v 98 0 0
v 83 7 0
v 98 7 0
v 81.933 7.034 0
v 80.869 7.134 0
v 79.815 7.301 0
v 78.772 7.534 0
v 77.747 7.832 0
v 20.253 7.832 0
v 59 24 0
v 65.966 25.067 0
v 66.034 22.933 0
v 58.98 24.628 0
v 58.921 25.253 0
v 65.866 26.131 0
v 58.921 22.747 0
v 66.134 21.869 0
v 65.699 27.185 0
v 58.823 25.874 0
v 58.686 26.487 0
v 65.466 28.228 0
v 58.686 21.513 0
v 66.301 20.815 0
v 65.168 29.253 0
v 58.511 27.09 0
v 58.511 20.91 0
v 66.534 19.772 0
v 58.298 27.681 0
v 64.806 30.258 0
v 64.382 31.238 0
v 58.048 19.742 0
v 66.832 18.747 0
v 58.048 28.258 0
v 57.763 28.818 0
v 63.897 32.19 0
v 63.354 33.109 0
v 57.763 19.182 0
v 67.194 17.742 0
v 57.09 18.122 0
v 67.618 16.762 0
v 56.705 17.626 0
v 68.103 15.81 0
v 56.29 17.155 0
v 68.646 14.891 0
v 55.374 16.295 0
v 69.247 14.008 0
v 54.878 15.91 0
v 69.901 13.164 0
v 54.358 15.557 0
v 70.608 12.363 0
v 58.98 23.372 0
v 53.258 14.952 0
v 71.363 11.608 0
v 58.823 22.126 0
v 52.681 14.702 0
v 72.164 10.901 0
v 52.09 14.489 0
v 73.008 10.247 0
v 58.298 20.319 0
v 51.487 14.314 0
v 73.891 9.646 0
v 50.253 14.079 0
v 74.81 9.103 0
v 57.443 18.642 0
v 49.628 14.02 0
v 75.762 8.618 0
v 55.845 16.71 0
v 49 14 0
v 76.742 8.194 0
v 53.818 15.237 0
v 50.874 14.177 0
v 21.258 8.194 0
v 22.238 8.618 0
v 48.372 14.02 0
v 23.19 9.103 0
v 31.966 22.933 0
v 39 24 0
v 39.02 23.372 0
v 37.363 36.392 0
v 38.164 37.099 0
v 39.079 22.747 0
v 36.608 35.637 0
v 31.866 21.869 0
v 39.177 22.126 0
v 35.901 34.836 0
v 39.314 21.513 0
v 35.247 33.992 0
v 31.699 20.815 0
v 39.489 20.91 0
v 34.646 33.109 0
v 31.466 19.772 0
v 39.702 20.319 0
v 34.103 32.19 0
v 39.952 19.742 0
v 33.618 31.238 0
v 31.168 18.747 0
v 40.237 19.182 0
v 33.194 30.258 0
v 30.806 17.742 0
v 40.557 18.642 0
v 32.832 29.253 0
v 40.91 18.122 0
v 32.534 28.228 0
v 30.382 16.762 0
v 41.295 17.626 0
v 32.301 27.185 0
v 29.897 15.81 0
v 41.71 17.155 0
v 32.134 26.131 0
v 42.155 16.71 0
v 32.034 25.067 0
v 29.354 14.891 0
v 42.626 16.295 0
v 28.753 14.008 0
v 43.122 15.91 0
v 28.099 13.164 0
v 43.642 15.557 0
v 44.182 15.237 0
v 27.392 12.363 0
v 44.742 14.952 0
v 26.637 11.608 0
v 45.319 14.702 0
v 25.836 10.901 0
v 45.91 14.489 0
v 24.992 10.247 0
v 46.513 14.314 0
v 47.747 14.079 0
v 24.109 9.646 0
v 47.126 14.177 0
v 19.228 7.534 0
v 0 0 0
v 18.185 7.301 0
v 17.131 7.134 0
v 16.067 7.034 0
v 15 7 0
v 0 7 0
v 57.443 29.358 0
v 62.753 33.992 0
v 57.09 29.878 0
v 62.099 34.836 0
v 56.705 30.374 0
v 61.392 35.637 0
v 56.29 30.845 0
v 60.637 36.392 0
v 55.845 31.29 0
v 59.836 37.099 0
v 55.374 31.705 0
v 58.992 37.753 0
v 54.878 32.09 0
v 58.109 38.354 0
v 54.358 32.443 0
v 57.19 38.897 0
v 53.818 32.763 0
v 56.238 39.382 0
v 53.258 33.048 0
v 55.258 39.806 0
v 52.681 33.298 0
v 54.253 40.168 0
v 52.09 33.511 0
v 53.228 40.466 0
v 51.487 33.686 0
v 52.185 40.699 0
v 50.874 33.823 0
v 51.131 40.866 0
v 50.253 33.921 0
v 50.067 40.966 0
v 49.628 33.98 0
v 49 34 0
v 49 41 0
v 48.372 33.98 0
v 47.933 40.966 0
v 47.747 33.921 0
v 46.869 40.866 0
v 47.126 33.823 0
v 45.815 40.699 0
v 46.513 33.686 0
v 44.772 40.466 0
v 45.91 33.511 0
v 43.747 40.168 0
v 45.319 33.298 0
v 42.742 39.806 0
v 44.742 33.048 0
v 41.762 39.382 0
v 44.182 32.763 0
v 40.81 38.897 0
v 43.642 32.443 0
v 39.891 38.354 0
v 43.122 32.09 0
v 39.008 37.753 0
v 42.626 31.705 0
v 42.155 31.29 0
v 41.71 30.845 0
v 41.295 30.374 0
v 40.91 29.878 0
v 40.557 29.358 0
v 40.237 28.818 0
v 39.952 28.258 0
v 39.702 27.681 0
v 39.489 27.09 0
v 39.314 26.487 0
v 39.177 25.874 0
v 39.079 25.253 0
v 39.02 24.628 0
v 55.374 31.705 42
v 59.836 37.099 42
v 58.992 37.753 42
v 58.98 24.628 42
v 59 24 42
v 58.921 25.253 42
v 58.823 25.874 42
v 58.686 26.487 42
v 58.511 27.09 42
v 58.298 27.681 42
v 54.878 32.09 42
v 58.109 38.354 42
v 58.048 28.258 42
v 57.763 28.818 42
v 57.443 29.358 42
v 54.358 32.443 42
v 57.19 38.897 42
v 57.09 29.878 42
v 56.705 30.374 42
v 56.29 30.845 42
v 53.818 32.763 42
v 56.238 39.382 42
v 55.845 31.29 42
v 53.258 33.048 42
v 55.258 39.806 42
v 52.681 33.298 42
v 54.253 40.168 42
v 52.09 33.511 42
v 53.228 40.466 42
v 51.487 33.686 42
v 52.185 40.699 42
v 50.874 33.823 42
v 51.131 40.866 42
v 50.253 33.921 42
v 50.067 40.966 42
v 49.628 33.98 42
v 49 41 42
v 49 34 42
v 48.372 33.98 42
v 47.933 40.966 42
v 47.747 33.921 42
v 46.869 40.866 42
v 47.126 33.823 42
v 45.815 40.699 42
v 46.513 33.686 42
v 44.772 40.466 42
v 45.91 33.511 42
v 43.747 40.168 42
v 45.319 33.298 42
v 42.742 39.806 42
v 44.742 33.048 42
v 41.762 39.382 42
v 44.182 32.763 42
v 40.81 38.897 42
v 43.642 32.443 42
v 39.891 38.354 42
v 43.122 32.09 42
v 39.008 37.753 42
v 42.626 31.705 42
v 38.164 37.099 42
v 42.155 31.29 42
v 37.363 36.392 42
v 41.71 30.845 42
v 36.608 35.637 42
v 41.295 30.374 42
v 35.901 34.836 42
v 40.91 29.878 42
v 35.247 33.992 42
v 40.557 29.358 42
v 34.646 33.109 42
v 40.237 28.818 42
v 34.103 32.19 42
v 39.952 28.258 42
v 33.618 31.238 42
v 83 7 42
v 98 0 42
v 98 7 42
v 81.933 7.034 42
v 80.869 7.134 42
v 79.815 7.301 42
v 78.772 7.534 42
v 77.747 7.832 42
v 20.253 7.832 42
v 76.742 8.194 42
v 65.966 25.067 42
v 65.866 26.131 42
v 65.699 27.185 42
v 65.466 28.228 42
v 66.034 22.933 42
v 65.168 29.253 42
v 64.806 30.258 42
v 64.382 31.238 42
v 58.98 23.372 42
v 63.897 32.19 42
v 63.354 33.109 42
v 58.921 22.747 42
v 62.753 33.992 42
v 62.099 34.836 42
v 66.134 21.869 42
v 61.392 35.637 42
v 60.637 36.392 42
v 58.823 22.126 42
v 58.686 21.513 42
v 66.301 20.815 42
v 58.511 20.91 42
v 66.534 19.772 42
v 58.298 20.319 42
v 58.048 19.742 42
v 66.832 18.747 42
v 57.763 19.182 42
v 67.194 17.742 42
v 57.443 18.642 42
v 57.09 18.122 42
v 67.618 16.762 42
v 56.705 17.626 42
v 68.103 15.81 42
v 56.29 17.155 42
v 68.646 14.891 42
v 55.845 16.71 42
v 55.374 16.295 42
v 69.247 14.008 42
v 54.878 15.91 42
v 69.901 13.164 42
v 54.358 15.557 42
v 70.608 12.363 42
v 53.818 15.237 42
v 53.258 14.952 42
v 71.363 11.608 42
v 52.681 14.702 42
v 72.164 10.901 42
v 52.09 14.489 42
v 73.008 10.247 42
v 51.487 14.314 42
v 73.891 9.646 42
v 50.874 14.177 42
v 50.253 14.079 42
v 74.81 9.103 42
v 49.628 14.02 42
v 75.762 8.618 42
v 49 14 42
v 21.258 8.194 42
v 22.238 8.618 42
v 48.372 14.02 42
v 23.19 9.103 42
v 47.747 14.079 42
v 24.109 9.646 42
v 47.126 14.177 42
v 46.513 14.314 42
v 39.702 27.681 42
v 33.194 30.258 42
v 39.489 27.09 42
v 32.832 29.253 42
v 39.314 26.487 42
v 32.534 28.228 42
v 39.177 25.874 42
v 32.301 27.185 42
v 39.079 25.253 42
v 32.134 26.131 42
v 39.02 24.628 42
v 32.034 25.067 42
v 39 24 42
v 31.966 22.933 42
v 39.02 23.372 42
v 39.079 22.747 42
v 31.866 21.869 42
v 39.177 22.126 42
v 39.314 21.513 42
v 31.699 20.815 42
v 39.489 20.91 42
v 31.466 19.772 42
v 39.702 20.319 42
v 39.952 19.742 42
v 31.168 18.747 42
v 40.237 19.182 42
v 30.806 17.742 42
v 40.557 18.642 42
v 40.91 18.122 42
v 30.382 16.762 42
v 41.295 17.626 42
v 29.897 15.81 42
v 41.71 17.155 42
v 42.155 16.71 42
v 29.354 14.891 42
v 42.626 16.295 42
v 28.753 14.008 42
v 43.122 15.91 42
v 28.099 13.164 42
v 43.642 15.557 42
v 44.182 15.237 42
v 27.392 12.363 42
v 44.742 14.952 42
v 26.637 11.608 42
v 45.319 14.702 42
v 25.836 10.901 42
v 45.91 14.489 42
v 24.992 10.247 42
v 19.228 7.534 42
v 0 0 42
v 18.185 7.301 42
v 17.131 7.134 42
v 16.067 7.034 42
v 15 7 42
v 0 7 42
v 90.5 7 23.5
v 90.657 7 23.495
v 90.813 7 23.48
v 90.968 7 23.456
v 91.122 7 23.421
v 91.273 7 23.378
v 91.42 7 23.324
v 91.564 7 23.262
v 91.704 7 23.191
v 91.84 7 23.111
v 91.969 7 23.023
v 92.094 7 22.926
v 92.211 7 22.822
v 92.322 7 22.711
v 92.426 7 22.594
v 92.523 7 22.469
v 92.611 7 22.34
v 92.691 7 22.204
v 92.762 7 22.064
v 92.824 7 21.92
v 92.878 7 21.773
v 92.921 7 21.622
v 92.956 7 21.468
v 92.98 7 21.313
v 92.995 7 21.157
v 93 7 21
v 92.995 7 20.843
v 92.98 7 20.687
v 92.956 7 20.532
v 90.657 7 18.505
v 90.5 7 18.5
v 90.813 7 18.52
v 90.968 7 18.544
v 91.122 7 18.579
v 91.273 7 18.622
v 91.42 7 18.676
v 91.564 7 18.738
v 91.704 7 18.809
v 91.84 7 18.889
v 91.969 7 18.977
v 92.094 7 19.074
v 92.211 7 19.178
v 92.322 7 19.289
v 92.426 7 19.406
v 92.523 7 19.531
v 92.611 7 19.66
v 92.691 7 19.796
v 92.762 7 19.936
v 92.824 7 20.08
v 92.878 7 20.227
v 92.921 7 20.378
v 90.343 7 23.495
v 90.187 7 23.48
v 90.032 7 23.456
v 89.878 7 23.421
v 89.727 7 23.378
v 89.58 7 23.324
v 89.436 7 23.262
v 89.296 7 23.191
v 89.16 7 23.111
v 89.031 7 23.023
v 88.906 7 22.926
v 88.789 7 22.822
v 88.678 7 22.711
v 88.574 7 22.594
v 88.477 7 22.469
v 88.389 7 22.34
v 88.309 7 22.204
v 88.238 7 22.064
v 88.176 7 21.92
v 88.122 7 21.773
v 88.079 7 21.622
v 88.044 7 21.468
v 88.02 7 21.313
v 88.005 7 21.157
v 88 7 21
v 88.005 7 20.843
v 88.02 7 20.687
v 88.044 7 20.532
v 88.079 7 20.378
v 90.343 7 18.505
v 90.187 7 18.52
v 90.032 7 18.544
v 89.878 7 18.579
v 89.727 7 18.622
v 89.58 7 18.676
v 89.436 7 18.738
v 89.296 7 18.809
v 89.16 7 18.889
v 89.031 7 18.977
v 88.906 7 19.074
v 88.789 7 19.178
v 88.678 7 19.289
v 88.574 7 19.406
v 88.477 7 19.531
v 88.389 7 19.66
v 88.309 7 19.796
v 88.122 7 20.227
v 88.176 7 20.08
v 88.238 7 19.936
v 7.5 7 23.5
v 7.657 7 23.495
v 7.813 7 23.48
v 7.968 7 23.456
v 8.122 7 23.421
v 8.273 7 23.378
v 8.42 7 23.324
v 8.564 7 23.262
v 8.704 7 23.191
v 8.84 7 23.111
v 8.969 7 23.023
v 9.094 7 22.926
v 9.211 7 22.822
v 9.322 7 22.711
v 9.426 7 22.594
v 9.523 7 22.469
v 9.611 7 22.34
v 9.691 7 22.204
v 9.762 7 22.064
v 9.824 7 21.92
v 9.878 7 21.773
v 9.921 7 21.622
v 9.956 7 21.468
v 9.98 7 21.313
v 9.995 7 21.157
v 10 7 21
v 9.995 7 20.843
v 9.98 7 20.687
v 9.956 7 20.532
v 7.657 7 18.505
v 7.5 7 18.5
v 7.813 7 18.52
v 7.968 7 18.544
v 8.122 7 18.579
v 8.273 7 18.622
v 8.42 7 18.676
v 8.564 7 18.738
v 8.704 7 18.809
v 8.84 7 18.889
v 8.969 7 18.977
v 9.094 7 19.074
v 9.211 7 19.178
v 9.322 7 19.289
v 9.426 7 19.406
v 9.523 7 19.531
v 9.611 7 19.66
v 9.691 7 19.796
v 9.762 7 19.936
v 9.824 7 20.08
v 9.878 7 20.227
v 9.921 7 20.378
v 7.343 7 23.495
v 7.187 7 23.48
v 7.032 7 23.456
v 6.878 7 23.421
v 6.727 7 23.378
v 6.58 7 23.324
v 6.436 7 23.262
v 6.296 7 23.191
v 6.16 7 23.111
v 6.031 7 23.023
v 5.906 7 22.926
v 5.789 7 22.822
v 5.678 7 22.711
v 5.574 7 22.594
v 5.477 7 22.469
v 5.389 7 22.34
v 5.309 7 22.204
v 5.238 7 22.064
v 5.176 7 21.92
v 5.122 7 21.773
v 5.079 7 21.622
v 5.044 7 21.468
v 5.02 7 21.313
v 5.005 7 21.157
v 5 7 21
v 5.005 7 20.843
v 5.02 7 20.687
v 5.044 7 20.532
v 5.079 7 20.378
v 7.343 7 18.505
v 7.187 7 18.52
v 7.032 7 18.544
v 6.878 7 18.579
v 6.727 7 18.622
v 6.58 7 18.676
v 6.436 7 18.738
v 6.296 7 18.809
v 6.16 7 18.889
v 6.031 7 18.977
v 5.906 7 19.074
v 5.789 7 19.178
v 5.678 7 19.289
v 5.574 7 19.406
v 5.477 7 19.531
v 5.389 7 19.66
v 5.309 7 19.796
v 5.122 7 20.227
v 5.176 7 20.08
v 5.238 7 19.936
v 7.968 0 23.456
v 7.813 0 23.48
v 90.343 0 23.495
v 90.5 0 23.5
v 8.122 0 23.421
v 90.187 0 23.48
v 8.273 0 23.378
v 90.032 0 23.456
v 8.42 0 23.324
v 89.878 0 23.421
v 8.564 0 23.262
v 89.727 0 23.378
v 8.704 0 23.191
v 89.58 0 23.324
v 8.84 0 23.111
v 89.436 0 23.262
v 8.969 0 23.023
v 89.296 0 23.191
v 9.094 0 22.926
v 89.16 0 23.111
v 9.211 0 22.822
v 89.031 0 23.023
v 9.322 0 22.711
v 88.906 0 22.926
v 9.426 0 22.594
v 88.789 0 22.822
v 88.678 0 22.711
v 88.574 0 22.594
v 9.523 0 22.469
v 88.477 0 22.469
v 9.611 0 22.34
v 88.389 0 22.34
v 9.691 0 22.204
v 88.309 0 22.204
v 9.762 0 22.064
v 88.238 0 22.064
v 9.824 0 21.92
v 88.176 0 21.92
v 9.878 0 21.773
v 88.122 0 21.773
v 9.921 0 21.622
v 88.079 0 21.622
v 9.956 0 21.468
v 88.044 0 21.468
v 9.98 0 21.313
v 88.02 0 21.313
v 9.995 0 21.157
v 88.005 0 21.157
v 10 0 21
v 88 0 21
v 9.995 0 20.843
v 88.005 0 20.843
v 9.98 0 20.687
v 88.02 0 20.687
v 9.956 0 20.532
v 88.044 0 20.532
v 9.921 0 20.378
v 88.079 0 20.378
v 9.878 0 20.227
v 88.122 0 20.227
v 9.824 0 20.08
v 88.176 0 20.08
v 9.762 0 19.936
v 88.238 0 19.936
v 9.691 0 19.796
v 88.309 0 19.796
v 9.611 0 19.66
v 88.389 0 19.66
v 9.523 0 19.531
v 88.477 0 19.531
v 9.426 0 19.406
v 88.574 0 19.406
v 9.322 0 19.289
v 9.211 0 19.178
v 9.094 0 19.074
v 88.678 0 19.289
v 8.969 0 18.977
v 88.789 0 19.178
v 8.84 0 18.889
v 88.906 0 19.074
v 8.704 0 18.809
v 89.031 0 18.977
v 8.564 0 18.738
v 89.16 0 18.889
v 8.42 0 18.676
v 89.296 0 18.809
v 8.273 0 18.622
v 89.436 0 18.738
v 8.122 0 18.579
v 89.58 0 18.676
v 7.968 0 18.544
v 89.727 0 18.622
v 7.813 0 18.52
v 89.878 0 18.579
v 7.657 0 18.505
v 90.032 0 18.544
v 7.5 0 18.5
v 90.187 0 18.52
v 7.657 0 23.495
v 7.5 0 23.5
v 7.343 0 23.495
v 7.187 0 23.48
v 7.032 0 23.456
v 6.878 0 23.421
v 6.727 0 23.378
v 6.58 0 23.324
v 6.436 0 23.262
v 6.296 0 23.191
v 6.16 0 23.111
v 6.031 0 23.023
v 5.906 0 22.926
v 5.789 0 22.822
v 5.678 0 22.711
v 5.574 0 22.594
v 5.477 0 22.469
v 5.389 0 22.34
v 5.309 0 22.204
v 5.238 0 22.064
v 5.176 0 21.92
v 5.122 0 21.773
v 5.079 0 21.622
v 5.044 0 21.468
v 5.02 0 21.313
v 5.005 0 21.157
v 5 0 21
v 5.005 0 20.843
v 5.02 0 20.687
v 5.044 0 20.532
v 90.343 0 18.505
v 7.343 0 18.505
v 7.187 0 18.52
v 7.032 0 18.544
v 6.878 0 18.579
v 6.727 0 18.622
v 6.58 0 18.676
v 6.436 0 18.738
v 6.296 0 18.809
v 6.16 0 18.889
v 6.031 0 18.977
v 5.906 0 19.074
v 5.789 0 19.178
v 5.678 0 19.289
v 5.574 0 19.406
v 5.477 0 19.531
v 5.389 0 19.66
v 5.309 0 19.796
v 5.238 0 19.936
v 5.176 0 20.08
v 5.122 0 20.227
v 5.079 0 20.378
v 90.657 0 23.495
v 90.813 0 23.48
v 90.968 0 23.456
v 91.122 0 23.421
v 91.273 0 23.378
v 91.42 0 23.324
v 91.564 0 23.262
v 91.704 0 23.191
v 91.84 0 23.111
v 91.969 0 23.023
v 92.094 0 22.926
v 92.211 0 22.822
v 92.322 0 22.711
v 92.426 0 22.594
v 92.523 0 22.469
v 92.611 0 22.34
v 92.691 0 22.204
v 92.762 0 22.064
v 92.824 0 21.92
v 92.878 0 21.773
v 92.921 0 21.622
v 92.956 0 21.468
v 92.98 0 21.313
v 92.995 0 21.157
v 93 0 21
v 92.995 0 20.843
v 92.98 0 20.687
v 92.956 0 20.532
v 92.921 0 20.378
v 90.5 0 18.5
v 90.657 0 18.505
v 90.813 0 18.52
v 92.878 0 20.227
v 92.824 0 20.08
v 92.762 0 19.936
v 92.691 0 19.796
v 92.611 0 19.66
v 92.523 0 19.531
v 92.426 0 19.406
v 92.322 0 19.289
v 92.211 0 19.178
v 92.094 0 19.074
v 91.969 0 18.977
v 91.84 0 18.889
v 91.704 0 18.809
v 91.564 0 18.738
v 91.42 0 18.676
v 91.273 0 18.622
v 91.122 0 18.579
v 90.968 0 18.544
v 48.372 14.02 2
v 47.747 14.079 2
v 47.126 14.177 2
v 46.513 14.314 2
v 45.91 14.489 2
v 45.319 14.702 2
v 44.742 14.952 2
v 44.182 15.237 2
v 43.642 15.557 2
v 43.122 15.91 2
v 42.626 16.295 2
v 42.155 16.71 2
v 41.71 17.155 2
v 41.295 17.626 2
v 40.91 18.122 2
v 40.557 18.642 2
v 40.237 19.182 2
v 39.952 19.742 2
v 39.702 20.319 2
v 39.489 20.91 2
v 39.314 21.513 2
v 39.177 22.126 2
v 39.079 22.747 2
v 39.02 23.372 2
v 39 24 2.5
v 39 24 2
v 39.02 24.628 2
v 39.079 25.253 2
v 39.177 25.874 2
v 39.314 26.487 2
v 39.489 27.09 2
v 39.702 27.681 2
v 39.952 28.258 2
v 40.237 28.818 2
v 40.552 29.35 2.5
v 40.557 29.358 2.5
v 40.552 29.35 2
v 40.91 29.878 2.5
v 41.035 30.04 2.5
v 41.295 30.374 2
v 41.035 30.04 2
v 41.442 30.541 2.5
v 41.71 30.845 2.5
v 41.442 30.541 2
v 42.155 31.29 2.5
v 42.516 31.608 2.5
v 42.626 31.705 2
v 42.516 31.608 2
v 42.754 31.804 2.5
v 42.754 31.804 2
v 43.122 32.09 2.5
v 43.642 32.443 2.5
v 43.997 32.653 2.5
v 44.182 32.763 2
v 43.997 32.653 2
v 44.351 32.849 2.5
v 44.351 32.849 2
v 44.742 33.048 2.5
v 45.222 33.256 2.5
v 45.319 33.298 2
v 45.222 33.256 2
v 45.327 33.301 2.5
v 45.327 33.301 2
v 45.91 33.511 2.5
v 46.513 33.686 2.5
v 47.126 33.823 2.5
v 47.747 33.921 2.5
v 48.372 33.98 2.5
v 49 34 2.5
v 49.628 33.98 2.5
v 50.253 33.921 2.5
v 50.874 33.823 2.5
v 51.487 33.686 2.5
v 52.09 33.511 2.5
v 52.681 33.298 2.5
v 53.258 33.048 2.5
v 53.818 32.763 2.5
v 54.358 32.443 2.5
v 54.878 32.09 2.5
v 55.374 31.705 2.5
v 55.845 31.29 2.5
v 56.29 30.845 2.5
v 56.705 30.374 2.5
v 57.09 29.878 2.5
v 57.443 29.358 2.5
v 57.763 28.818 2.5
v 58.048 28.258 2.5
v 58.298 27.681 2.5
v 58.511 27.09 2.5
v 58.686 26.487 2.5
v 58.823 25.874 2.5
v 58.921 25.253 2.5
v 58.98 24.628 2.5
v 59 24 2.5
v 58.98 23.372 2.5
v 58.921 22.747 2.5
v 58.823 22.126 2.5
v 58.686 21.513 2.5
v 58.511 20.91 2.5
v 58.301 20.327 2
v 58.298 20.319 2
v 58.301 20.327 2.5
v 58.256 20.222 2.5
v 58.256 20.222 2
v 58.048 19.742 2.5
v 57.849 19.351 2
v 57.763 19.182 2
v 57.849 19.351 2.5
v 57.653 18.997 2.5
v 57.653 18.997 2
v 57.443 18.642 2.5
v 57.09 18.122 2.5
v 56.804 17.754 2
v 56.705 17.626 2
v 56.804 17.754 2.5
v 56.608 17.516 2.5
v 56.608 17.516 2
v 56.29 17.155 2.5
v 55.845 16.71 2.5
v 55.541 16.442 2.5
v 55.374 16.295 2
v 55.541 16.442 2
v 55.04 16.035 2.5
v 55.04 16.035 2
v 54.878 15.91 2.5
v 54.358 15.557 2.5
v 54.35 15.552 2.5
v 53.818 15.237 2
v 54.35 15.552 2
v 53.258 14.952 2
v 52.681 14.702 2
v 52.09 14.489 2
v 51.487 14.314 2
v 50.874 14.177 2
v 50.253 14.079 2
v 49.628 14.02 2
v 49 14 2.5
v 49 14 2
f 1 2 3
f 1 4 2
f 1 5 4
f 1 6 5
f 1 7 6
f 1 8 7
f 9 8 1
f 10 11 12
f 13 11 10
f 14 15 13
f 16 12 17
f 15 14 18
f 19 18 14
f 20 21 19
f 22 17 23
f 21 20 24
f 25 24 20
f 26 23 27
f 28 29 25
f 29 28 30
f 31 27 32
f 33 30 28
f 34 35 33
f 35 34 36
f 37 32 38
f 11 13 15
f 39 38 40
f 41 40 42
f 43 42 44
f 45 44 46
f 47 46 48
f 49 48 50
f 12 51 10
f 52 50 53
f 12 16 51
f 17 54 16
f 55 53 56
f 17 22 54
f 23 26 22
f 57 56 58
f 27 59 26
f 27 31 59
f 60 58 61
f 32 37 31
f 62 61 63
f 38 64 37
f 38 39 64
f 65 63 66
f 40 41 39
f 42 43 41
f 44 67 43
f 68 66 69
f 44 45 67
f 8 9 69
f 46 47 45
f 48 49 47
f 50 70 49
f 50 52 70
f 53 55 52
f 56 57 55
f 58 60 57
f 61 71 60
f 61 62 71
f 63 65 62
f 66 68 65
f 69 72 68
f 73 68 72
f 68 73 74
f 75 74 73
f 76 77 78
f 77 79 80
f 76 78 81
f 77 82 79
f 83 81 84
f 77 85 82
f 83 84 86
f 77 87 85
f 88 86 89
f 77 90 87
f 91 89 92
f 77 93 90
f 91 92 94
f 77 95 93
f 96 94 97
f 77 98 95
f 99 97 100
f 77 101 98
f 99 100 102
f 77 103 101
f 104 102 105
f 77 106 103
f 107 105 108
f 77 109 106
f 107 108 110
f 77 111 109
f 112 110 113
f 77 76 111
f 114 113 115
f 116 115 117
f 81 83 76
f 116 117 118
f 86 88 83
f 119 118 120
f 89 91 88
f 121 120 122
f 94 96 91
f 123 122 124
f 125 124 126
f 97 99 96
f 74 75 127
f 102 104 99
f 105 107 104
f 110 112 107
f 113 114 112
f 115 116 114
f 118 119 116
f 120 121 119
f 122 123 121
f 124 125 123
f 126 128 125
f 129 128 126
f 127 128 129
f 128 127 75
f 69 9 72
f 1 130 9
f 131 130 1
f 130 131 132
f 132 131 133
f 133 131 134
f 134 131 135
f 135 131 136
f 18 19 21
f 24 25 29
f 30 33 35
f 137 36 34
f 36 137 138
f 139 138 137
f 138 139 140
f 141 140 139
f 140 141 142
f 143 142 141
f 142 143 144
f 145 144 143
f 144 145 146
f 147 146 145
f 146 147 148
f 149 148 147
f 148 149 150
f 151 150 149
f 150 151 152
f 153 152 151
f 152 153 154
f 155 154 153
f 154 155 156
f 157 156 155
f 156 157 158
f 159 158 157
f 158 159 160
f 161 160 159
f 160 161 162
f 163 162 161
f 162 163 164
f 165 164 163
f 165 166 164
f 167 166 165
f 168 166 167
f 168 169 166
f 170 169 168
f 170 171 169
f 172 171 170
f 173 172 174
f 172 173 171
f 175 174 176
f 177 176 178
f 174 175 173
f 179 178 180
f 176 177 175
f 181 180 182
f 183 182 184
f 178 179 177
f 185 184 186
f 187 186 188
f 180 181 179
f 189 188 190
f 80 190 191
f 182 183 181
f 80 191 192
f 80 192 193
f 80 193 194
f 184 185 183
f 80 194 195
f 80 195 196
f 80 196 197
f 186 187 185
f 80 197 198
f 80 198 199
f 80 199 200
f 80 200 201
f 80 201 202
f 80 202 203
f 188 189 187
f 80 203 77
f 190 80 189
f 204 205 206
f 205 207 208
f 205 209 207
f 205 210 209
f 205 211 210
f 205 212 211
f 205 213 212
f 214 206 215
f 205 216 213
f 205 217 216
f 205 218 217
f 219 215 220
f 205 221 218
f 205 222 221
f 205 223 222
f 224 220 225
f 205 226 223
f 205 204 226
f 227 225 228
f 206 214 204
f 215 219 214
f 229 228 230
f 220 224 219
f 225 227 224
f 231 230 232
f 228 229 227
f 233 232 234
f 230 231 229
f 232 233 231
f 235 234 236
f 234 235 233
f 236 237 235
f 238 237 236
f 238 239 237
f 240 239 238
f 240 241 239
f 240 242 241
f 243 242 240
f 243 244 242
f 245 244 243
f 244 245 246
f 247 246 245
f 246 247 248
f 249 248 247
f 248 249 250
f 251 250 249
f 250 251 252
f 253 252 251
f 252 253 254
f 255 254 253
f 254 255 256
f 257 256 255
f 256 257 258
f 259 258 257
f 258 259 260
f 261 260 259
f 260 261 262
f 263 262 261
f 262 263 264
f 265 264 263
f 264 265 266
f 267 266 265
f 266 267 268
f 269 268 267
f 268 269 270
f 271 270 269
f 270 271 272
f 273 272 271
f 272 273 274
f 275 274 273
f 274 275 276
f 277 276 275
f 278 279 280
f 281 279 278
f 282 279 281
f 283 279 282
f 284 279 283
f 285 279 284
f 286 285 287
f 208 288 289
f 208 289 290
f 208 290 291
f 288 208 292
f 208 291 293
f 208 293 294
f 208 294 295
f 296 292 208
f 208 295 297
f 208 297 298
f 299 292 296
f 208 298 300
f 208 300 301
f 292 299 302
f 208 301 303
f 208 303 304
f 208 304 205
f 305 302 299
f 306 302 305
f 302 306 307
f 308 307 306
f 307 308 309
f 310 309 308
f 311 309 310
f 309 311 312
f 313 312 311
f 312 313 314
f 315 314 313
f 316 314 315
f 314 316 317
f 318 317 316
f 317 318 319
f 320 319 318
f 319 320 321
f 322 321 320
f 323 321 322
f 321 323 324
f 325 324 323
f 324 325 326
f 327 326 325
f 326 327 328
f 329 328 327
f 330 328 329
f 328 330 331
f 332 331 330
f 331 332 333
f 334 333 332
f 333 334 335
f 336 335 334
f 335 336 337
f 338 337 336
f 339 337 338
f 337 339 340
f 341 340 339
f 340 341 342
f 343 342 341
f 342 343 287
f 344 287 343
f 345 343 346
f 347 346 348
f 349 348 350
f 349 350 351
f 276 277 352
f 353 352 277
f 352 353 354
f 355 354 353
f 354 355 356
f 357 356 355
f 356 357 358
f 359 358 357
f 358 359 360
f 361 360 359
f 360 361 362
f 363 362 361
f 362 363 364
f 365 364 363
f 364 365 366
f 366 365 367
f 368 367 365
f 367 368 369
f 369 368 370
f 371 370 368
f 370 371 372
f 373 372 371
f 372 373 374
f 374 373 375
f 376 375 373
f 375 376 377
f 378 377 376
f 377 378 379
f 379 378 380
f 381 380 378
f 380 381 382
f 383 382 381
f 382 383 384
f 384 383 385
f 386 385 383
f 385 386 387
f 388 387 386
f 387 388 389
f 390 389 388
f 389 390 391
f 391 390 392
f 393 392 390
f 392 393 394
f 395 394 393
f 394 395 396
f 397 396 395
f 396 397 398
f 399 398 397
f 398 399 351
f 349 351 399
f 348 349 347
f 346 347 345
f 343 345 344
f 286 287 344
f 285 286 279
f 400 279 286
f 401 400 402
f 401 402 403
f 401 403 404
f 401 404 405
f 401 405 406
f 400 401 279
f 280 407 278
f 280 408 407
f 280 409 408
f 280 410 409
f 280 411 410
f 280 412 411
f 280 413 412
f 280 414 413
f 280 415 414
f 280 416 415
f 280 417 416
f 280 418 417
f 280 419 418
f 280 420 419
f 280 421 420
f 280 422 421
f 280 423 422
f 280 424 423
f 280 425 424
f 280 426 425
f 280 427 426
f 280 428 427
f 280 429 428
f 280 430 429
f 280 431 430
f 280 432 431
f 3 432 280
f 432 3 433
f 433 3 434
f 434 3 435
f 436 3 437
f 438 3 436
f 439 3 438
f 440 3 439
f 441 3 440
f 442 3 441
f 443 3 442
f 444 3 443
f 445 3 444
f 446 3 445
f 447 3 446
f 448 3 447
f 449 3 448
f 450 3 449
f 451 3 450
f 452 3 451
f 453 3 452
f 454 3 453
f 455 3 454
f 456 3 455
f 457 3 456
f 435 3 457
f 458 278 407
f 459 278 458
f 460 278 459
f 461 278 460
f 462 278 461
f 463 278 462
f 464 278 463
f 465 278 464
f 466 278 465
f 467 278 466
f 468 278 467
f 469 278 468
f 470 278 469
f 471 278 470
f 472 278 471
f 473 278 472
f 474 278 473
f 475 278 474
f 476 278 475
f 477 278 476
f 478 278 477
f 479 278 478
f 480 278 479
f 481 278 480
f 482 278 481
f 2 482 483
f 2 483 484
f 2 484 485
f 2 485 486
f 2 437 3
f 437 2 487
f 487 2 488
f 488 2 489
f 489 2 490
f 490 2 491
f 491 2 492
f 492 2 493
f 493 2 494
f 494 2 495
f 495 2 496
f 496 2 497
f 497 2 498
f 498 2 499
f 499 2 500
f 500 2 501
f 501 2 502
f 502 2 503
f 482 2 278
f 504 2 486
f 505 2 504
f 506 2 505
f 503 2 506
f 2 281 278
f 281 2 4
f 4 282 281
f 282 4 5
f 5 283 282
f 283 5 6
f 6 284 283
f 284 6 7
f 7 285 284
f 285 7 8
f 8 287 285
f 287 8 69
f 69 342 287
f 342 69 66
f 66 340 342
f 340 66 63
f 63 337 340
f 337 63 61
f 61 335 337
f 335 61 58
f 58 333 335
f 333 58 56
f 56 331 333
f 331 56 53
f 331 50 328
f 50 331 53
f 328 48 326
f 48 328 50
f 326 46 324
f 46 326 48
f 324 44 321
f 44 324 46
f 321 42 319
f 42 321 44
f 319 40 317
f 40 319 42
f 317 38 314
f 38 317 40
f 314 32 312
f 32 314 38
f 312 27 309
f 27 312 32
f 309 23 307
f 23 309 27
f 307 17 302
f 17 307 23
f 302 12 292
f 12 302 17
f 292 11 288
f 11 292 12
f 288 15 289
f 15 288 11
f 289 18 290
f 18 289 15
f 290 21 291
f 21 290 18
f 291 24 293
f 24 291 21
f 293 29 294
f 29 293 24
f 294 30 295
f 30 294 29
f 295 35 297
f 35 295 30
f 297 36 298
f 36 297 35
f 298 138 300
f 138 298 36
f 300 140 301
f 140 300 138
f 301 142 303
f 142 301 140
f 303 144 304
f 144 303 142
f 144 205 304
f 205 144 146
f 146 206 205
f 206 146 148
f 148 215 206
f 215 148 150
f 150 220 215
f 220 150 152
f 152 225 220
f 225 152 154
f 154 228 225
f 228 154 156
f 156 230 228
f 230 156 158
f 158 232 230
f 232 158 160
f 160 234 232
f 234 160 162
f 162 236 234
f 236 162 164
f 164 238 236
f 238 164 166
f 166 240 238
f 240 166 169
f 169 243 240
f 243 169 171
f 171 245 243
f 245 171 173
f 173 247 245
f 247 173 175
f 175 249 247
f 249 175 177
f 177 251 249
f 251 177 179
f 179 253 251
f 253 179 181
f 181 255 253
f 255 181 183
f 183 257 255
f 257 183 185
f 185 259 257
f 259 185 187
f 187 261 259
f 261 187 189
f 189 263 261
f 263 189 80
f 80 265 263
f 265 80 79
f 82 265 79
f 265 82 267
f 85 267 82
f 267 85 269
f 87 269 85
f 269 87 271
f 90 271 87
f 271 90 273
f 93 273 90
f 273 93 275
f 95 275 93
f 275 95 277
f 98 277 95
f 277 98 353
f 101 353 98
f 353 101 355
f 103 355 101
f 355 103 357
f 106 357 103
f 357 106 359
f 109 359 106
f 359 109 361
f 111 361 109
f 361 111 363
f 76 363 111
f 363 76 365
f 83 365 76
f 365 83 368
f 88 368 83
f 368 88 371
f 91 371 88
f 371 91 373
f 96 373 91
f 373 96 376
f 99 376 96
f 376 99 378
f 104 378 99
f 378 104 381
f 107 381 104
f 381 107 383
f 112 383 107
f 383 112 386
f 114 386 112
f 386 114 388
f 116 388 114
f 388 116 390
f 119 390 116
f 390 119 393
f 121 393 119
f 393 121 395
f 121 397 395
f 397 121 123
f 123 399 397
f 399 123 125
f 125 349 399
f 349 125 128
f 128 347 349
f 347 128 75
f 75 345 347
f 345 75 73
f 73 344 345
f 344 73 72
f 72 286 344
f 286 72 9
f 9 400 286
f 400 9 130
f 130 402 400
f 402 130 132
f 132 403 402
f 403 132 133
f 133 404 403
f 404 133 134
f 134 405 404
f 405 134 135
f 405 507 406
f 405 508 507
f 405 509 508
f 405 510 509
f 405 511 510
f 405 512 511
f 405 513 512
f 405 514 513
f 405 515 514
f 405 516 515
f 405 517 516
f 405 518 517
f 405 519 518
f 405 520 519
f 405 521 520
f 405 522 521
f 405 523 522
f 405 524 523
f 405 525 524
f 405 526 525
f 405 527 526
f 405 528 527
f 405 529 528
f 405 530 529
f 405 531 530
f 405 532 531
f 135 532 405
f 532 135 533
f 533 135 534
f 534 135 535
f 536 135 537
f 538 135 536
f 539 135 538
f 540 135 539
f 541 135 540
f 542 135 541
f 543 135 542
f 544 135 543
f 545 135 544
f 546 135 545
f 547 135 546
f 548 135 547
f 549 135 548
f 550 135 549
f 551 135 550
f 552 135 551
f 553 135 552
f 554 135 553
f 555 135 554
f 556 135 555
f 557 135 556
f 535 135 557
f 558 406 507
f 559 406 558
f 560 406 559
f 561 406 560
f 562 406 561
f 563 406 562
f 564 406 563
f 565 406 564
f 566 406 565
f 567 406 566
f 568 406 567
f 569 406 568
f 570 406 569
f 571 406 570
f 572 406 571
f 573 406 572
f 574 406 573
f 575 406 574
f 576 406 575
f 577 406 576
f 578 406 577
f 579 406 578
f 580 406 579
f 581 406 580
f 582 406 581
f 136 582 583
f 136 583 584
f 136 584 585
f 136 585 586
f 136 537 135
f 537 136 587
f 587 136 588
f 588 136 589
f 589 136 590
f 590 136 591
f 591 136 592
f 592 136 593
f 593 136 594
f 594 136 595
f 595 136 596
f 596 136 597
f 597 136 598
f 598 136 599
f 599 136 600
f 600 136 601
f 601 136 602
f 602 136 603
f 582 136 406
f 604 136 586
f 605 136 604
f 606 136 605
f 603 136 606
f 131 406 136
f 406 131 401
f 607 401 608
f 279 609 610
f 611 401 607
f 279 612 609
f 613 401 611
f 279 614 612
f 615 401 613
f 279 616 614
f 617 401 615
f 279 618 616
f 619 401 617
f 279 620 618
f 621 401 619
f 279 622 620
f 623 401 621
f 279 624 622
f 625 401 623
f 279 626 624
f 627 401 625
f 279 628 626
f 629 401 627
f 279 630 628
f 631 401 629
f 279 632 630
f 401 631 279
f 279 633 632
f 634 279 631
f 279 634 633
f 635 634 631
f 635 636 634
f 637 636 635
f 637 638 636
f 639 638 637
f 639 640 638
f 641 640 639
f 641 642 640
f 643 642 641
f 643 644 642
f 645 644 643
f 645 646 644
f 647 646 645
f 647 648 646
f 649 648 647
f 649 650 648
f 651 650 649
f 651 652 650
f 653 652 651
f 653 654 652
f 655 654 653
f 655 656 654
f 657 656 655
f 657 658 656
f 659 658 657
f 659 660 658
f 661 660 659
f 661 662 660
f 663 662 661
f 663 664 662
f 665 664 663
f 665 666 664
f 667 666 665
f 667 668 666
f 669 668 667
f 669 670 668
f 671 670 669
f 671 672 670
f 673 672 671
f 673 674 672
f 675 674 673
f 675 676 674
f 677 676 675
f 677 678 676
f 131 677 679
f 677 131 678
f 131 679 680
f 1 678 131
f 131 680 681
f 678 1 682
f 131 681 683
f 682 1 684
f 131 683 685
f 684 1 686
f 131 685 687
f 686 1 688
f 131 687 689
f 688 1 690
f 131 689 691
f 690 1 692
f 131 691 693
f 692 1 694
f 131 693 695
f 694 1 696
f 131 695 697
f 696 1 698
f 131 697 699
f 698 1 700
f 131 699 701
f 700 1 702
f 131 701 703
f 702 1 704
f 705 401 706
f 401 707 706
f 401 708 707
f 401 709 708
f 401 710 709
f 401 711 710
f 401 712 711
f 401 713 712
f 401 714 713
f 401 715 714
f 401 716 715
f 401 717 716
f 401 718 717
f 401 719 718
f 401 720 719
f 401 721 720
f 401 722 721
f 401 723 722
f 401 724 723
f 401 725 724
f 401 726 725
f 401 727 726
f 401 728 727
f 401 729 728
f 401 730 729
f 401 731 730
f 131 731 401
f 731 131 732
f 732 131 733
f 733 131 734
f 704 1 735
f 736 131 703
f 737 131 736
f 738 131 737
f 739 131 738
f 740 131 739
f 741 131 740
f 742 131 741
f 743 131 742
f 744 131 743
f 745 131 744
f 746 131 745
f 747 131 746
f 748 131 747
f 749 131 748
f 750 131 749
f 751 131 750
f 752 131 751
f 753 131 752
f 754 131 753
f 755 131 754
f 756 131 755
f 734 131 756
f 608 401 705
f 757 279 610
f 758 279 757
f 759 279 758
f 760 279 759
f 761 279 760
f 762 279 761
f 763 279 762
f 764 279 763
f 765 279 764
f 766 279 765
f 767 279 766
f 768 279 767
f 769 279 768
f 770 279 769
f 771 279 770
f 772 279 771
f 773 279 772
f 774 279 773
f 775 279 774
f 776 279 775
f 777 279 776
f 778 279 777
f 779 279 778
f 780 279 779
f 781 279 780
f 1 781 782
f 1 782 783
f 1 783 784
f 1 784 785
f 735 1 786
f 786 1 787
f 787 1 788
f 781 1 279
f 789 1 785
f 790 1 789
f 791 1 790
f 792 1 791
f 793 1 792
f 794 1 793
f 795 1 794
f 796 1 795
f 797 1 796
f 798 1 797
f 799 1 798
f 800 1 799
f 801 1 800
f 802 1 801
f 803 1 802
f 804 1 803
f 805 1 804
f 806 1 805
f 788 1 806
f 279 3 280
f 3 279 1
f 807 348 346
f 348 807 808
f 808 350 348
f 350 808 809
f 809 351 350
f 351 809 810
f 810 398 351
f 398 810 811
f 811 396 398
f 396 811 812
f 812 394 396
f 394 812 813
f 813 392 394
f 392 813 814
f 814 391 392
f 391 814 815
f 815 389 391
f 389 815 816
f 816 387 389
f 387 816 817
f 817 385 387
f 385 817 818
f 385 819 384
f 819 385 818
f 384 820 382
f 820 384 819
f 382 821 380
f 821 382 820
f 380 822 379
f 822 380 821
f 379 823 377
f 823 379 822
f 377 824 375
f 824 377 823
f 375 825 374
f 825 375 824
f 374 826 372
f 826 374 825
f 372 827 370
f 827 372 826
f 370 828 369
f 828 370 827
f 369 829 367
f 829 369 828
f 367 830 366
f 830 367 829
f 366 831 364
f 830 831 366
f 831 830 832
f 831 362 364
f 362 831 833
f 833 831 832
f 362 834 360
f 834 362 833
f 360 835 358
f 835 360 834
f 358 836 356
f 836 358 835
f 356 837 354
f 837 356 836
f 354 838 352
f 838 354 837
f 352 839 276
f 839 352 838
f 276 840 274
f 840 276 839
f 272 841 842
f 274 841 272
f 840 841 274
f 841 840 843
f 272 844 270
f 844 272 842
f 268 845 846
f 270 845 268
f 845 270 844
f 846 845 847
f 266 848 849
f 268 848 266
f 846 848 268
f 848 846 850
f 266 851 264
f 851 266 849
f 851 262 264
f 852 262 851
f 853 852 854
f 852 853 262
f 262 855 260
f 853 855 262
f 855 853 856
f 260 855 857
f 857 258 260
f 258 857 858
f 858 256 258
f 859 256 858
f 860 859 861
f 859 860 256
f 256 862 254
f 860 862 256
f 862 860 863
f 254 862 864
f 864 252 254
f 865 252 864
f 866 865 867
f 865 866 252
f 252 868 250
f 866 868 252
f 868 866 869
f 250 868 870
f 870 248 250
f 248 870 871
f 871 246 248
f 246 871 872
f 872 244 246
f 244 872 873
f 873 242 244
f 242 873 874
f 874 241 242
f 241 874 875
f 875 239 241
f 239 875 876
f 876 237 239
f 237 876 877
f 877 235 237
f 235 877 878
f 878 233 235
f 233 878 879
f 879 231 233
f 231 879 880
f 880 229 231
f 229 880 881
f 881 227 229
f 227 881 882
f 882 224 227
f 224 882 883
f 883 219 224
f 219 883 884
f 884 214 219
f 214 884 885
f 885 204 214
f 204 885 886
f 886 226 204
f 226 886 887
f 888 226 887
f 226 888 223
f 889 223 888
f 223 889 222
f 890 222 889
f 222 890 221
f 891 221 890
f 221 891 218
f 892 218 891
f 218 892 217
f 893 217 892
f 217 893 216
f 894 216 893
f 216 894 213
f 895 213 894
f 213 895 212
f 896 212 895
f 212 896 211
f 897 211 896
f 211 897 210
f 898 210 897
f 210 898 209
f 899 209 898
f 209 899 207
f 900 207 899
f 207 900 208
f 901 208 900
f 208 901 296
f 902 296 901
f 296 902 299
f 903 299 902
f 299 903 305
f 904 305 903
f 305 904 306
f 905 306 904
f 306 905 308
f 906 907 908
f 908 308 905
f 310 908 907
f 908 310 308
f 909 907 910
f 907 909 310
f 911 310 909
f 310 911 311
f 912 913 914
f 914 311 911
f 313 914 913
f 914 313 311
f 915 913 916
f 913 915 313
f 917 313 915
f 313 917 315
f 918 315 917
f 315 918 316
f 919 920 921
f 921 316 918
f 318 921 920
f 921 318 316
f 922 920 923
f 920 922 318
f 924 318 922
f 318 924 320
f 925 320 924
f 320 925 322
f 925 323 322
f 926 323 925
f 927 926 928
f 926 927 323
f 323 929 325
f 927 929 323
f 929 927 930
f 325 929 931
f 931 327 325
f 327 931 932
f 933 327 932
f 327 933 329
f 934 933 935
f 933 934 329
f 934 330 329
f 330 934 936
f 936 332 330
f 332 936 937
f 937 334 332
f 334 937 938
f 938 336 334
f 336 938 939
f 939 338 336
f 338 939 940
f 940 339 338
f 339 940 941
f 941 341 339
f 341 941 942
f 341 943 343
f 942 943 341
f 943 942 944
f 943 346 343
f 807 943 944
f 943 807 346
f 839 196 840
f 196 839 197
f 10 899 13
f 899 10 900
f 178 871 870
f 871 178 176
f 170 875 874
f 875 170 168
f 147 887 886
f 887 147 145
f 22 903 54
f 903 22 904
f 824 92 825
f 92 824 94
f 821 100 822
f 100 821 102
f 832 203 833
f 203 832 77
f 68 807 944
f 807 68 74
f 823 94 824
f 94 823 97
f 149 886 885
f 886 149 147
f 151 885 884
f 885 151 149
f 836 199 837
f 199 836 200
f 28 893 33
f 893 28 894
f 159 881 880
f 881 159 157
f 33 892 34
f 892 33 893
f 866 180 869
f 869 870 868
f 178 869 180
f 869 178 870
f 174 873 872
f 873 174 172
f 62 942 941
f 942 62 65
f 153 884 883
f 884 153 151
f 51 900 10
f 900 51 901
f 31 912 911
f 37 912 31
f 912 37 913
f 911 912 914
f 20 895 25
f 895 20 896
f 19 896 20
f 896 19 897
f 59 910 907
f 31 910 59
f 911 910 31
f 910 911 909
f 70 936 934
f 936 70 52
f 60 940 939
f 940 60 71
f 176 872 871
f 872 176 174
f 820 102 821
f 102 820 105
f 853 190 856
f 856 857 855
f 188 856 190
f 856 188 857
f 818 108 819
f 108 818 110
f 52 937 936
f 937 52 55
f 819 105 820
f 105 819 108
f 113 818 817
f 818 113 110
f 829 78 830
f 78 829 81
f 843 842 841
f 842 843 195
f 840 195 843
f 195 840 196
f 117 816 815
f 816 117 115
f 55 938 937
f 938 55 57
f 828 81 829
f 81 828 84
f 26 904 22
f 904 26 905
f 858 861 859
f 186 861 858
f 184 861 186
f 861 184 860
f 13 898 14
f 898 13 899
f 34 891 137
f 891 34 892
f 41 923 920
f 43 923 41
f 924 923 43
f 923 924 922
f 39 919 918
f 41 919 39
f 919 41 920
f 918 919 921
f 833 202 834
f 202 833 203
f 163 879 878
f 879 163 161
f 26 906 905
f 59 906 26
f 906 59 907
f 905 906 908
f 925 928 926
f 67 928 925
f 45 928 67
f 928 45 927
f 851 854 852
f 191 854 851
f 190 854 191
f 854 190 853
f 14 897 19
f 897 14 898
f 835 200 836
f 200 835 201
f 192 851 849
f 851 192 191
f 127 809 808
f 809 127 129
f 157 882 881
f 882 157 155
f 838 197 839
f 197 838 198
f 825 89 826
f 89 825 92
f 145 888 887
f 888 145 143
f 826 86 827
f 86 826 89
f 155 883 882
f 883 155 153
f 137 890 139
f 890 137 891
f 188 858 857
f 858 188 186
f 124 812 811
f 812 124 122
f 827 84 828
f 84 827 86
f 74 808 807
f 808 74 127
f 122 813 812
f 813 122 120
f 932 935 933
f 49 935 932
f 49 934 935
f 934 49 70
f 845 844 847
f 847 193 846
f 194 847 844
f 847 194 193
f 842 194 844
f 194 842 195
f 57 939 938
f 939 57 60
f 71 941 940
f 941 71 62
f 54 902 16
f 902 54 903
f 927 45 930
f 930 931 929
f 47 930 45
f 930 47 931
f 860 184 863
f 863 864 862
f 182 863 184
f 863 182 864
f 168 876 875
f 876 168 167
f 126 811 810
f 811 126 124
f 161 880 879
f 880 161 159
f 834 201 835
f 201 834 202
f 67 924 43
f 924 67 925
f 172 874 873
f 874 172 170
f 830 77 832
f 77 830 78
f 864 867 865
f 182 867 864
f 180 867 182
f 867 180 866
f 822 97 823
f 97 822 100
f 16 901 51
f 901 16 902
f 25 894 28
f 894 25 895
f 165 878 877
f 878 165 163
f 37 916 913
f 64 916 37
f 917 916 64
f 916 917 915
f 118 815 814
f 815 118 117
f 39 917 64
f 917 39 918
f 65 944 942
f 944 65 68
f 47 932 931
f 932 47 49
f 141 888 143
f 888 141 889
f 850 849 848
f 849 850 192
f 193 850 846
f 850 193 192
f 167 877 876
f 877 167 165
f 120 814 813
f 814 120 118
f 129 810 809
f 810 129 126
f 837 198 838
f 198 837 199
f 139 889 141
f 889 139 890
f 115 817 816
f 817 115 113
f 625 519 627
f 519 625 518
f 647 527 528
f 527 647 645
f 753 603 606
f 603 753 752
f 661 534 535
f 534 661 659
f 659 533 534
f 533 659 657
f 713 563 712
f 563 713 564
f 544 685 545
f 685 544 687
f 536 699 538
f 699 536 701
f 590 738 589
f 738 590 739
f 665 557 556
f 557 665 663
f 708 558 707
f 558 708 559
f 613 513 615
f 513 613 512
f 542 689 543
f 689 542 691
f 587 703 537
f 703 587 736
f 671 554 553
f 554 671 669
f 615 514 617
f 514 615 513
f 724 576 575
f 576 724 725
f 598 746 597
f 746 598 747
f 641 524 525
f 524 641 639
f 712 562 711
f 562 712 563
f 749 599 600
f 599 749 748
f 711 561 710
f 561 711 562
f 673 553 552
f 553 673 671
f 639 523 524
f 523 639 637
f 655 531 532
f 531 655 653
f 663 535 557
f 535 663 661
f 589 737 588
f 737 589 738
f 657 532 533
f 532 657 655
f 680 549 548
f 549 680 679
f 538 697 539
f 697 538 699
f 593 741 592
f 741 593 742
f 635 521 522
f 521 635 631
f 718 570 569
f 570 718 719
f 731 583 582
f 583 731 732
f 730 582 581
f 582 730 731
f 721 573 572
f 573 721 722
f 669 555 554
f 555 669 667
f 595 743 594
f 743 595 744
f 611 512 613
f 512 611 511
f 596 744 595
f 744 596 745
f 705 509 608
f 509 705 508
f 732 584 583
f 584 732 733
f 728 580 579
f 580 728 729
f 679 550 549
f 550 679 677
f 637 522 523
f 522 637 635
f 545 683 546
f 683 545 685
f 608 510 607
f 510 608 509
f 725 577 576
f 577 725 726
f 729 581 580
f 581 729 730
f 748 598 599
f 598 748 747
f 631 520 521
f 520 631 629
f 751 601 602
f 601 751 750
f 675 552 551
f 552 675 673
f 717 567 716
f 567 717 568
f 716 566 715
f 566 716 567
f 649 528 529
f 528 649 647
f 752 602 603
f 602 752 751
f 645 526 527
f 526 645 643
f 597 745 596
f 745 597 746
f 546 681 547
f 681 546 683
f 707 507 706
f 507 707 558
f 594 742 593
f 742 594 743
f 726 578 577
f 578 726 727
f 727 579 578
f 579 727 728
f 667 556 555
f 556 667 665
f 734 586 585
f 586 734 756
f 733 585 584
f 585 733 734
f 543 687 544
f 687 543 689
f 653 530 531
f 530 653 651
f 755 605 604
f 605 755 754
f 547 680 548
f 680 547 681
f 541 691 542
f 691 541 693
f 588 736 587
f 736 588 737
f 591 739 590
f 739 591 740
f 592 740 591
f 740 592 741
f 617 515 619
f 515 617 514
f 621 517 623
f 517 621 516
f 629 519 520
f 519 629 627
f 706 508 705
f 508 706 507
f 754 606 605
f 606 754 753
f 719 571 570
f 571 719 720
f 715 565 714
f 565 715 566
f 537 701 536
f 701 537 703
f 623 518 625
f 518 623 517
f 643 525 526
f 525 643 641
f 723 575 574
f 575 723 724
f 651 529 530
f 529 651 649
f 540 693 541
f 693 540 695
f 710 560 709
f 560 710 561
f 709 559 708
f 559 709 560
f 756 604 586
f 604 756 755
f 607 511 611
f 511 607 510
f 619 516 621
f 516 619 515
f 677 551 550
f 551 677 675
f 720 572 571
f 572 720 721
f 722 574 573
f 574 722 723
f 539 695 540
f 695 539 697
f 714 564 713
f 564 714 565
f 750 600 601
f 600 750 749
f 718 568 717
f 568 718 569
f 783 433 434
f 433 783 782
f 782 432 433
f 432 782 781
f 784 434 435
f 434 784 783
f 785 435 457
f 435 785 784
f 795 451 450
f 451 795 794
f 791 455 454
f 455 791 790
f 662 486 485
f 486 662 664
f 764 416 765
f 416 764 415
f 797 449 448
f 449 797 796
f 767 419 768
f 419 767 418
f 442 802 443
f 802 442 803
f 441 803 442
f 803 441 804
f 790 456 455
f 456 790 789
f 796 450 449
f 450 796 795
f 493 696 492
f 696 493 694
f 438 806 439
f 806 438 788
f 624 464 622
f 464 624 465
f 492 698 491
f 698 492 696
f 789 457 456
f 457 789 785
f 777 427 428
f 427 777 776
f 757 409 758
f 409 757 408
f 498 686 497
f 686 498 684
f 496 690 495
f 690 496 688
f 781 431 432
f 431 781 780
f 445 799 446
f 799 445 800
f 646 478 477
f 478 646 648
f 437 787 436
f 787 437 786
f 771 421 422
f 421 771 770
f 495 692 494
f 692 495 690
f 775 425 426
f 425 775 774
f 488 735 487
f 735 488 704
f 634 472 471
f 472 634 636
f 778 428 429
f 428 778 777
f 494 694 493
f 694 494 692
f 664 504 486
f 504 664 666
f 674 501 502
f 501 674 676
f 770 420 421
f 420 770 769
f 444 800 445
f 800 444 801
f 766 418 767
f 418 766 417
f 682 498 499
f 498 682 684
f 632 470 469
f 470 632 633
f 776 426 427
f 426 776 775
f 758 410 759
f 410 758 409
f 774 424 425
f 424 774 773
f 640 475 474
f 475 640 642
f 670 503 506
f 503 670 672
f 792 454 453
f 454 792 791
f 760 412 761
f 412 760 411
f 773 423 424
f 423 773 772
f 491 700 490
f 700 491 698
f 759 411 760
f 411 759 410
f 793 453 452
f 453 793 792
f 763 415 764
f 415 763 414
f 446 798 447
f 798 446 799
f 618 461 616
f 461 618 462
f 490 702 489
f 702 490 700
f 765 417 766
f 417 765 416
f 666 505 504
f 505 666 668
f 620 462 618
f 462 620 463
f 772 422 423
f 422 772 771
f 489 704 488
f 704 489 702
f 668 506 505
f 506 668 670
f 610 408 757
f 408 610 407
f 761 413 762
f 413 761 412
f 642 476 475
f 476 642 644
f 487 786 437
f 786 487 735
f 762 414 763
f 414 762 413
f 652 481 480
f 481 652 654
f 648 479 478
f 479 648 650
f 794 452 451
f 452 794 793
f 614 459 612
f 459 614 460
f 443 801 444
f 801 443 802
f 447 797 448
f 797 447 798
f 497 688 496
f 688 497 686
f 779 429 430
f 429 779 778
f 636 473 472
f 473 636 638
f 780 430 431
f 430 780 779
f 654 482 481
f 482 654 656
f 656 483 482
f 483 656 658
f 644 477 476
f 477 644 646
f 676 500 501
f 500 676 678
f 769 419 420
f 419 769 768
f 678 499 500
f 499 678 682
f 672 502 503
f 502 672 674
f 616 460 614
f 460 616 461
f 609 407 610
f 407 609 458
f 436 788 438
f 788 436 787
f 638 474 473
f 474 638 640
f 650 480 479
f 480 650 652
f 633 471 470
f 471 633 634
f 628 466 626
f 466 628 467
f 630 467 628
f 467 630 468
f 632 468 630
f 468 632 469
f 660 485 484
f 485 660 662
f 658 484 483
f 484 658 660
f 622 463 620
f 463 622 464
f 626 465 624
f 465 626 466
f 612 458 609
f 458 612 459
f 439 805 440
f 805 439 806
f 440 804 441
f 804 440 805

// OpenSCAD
$fn = 100;

bearing_outer_diameter = 10; // in mm
bearing_thickness = 40; // in mm
mounting_hole_diameter=5; // diameter of the mounting bolts

bearing_OD_pillowblock_thickness = 7; // in mm
lip_size = 0; // lip intrusion into bearing holder
lip_thickness = 2; // lip thickness for holding the bearing in place

lift = 7; // thickness of lower block
mounting_pad=3; // ratio of width of the mounting tabs as a function of the bolt diameter

thickness=lip_thickness+bearing_thickness; // depth of the pillow block
r=bearing_outer_diameter + bearing_OD_pillowblock_thickness;  // outer radii, this should be calculated based on the desired hole size

difference()
{
  difference()
  {
    union()
    {
      linear_extrude(height=thickness, center=false, convexity=10, twist=0)
      {
	difference()
	{
	  union()
	  {
	    translate([mounting_hole_diameter*mounting_pad,0]) square([4*r,r+lift]);
	    translate([mounting_hole_diameter*mounting_pad+2*r,r+lift]) circle(r=r);
	    square([mounting_hole_diameter*mounting_pad,lift]);
	    translate([mounting_hole_diameter*mounting_pad+4*r,0]) square([mounting_hole_diameter*mounting_pad,lift]);
	  }
	  translate([mounting_hole_diameter*mounting_pad,r+lift]) circle(r=r);
	  translate([mounting_hole_diameter*mounting_pad+4*r,r+lift]) circle(r=r);
	  translate([mounting_hole_diameter*mounting_pad+2*r,r+lift]) circle(r=bearing_outer_diameter);
	}
      }

      translate([mounting_hole_diameter*mounting_pad+2*r,r+lift]) cylinder(r=bearing_outer_diameter*1.1,h=lip_thickness);
    }

    translate([mounting_hole_diameter*mounting_pad+2*r,r+lift,-0.5]) cylinder(r=bearing_outer_diameter-lip_size,h=lip_thickness+1);
  }

  translate([mounting_pad*mounting_hole_diameter/2,-1,thickness/2]) rotate([-90,0,0]) cylinder(r=mounting_hole_diameter/2,h=lift+2);
  translate([4*r+3*mounting_pad*mounting_hole_diameter/2,-1,thickness/2]) rotate([-90,0,0]) cylinder(r=mounting_hole_diameter/2,h=lift+2);

}
